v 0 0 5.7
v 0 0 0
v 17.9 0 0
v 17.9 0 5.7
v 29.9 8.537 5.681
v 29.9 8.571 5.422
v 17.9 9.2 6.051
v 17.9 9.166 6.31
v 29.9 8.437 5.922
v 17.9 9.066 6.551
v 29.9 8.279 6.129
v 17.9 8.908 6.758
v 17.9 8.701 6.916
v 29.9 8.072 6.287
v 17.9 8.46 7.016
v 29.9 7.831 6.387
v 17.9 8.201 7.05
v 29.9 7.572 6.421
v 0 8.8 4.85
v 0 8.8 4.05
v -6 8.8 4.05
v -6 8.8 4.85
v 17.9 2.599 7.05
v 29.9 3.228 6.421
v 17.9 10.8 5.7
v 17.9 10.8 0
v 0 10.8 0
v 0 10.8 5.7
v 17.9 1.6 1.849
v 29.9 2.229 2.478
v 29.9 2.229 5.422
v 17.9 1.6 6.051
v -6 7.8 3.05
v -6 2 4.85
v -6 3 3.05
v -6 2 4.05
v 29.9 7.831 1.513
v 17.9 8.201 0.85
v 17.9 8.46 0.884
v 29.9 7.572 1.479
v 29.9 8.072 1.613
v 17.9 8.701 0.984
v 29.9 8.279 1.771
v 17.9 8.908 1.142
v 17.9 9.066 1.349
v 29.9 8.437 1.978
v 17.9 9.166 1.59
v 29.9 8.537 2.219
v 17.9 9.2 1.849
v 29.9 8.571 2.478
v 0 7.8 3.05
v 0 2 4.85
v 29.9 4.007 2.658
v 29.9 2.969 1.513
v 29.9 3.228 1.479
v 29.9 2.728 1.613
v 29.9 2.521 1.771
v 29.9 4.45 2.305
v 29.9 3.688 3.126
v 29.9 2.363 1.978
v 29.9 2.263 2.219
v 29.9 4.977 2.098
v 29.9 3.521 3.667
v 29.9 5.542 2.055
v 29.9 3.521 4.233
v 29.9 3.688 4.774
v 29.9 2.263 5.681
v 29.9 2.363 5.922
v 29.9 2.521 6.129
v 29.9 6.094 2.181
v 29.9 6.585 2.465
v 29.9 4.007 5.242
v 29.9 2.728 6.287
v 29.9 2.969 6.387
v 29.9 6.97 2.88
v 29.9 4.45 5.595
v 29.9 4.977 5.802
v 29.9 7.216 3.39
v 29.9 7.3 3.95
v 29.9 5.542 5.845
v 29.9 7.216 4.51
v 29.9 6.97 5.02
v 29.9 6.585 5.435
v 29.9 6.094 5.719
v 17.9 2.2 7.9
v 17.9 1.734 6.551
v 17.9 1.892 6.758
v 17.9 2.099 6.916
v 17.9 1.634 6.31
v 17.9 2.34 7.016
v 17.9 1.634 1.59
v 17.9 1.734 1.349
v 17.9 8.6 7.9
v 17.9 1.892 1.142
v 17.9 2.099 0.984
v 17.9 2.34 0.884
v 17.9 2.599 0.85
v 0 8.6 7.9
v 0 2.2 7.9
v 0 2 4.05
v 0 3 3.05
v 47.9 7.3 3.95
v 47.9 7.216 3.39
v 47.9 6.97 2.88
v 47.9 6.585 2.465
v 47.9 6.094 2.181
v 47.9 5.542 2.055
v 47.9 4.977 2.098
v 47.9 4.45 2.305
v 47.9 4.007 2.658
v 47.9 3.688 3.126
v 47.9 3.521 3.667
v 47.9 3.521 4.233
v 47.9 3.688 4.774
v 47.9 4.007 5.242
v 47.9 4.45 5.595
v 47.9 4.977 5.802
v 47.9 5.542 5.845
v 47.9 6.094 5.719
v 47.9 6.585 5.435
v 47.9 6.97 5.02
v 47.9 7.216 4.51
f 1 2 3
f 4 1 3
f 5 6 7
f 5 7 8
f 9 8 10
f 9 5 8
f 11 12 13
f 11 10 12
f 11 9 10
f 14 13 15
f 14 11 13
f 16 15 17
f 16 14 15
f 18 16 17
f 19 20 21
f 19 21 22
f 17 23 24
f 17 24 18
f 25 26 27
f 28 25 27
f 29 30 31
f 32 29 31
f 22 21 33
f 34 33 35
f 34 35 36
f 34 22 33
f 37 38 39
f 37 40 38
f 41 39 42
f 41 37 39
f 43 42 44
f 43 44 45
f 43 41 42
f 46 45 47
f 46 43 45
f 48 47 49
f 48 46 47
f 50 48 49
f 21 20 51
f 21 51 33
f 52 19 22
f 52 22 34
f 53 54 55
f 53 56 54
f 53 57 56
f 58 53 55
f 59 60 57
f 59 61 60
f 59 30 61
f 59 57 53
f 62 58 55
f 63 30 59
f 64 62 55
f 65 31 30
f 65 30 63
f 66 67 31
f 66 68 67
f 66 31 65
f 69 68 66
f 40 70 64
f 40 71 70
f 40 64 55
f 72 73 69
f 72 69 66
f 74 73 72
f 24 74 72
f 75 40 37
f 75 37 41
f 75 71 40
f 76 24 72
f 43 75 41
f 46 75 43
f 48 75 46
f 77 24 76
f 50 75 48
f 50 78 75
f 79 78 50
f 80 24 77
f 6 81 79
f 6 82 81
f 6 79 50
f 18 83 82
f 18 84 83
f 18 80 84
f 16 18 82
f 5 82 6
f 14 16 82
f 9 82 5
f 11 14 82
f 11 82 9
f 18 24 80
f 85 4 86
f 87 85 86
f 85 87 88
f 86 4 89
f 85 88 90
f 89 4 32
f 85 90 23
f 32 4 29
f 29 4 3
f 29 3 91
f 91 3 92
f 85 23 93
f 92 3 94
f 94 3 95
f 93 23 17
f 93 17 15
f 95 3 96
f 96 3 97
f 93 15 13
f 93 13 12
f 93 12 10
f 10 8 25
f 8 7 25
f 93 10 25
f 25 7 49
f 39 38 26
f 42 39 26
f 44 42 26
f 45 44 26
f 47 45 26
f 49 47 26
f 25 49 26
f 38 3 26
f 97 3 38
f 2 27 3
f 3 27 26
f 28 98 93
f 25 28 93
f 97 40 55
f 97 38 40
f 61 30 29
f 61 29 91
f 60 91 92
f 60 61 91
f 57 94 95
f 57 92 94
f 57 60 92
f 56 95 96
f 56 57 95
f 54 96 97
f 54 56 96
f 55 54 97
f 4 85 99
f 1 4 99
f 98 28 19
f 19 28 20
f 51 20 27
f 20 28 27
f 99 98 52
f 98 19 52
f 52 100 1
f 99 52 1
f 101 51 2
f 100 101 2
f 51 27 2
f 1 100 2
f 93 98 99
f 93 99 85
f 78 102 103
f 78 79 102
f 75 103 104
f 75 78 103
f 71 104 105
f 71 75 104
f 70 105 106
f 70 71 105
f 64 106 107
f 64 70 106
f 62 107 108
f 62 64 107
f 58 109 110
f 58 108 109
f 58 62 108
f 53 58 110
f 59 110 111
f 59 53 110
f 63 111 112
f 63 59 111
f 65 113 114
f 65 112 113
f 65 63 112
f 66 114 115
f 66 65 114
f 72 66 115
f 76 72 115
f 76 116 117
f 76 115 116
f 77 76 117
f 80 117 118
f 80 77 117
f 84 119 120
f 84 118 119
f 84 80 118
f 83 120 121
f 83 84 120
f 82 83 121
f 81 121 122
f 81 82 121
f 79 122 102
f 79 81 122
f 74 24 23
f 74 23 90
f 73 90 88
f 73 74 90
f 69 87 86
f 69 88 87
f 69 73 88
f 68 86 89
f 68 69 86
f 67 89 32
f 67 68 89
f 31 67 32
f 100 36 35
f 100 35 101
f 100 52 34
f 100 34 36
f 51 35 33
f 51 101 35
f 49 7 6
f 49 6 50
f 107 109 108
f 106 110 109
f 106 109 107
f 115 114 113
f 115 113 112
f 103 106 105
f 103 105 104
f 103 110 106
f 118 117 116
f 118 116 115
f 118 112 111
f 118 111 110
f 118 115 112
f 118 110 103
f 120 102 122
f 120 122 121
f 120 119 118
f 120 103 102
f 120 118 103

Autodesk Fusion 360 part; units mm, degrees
sketch "Sketch1" plane through (0, 0, 0) normal (0, 0, 1) x (1, 0, 0)
  line L0 (0, 0) -> (17.9, 0)
  line L1 (17.9, 0) -> (17.9, 10.8)
  line L2 (17.9, 10.8) -> (0, 10.8)
  line L3 (0, 10.8) -> (0, 0)
  dimension "d1" = 17.9
  dimension "d2" = 10.8
extrude "Extrude1" add sketch "Sketch1" along normal blind 7.9
chamfer "Chamfer1" distance 2.2 angle 45 2 edges at (8.95, 10.8, 7.9) (8.95, 0, 7.9)
sketch "Sketch2" plane through (0, 0, 0) normal (-1, 0, 0) x (0, -1, 0)
  line L0 (0, 5.7) -> (-2.2, 7.9)
  line L1 (-2.2, 7.9) -> (-8.6, 7.9)
  line L2 (-8.6, 7.9) -> (-10.8, 5.7)
  line L3 (-10.8, 5.7) -> (-10.8, 0)
  line L4 (-10.8, 0) -> (0, 0)
  line L5 (0, 0) -> (0, 5.7)
  line L6 (-5.4, 7.9) -> (-5.4, 0) construction
  line L7 (-5.4, 3.95) -> (0, 3.95) construction
  line L8 (-2, 3.05) -> (-8.8, 3.05)
  line L9 (-8.8, 3.05) -> (-8.8, 4.85)
  line L10 (-8.8, 4.85) -> (-2, 4.85)
  line L11 (-2, 4.85) -> (-2, 3.05)
  line L12 (-2, 3.05) -> (-8.8, 4.85) construction
  line L13 (-8.8, 3.05) -> (-2, 4.85) construction
  point P0 (-5.4, 3.95)
  dimension "d6" = 6.8
  dimension "d7" = 1.8
extrude "Extrude2" add sketch "Sketch2" along normal blind 6 contours L8 L9 L10 L11
chamfer "Chamfer2" distance 1 angle 45 2 edges at (-3, 8.8, 3.05) (-3, 2, 3.05)
sketch "Sketch3" plane through (17.9, 0, 0) normal (1, 0, 0) x (0, 1, 0)
  line L0 (2.2, 7.9) -> (0, 5.7)
  line L1 (0, 5.7) -> (0, 0)
  line L2 (0, 0) -> (10.8, 0)
  line L3 (10.8, 0) -> (10.8, 5.7)
  line L4 (10.8, 5.7) -> (8.6, 7.9)
  line L5 (8.6, 7.9) -> (2.2, 7.9)
  line L6 (5.4, 7.9) -> (5.4, 0) construction
  line L7 (5.4, 3.95) -> (10.8, 3.95) construction
  line L8 (9.2, 0.85) -> (1.6, 0.85)
  line L9 (1.6, 0.85) -> (1.6, 7.05)
  line L10 (1.6, 7.05) -> (9.2, 7.05)
  line L11 (9.2, 7.05) -> (9.2, 0.85)
  line L12 (9.2, 0.85) -> (1.6, 7.05) construction
  line L13 (1.6, 0.85) -> (9.2, 7.05) construction
  point P0 (5.4, 3.95)
  dimension "d11" = 6.2
  dimension "d12" = 7.6
extrude "Extrude3" add sketch "Sketch3" along normal blind 12 draft -3 contours L8 L9 L10 L11
sketch "Sketch4" plane through (29.9, 0, 0) normal (1, 0, 0) x (0, 1, 0)
  line L0 (8.5711, 1.4789) -> (8.5711, 6.4211)
  line L1 (8.5711, 6.4211) -> (2.2289, 6.4211)
  line L2 (2.2289, 6.4211) -> (2.2289, 1.4789)
  line L3 (2.2289, 1.4789) -> (8.5711, 1.4789)
  line L4 (5.4, 6.4211) -> (5.4, 1.4789) construction
  line L5 (2.2289, 3.95) -> (8.5711, 3.95) construction
  circle A0 centre (5.4, 3.95) radius 1.9
  dimension "d15" = 3.8
extrude "Extrude4" add sketch "Sketch4" along normal blind 18 contours A0
fillet "Fillet1" radius 1 4 edges at (23.9, 1.9144, 6.7356) (23.9, 8.8856, 6.7356) (23.9, 1.9144, 1.1644) (23.9, 8.8856, 1.1644)
